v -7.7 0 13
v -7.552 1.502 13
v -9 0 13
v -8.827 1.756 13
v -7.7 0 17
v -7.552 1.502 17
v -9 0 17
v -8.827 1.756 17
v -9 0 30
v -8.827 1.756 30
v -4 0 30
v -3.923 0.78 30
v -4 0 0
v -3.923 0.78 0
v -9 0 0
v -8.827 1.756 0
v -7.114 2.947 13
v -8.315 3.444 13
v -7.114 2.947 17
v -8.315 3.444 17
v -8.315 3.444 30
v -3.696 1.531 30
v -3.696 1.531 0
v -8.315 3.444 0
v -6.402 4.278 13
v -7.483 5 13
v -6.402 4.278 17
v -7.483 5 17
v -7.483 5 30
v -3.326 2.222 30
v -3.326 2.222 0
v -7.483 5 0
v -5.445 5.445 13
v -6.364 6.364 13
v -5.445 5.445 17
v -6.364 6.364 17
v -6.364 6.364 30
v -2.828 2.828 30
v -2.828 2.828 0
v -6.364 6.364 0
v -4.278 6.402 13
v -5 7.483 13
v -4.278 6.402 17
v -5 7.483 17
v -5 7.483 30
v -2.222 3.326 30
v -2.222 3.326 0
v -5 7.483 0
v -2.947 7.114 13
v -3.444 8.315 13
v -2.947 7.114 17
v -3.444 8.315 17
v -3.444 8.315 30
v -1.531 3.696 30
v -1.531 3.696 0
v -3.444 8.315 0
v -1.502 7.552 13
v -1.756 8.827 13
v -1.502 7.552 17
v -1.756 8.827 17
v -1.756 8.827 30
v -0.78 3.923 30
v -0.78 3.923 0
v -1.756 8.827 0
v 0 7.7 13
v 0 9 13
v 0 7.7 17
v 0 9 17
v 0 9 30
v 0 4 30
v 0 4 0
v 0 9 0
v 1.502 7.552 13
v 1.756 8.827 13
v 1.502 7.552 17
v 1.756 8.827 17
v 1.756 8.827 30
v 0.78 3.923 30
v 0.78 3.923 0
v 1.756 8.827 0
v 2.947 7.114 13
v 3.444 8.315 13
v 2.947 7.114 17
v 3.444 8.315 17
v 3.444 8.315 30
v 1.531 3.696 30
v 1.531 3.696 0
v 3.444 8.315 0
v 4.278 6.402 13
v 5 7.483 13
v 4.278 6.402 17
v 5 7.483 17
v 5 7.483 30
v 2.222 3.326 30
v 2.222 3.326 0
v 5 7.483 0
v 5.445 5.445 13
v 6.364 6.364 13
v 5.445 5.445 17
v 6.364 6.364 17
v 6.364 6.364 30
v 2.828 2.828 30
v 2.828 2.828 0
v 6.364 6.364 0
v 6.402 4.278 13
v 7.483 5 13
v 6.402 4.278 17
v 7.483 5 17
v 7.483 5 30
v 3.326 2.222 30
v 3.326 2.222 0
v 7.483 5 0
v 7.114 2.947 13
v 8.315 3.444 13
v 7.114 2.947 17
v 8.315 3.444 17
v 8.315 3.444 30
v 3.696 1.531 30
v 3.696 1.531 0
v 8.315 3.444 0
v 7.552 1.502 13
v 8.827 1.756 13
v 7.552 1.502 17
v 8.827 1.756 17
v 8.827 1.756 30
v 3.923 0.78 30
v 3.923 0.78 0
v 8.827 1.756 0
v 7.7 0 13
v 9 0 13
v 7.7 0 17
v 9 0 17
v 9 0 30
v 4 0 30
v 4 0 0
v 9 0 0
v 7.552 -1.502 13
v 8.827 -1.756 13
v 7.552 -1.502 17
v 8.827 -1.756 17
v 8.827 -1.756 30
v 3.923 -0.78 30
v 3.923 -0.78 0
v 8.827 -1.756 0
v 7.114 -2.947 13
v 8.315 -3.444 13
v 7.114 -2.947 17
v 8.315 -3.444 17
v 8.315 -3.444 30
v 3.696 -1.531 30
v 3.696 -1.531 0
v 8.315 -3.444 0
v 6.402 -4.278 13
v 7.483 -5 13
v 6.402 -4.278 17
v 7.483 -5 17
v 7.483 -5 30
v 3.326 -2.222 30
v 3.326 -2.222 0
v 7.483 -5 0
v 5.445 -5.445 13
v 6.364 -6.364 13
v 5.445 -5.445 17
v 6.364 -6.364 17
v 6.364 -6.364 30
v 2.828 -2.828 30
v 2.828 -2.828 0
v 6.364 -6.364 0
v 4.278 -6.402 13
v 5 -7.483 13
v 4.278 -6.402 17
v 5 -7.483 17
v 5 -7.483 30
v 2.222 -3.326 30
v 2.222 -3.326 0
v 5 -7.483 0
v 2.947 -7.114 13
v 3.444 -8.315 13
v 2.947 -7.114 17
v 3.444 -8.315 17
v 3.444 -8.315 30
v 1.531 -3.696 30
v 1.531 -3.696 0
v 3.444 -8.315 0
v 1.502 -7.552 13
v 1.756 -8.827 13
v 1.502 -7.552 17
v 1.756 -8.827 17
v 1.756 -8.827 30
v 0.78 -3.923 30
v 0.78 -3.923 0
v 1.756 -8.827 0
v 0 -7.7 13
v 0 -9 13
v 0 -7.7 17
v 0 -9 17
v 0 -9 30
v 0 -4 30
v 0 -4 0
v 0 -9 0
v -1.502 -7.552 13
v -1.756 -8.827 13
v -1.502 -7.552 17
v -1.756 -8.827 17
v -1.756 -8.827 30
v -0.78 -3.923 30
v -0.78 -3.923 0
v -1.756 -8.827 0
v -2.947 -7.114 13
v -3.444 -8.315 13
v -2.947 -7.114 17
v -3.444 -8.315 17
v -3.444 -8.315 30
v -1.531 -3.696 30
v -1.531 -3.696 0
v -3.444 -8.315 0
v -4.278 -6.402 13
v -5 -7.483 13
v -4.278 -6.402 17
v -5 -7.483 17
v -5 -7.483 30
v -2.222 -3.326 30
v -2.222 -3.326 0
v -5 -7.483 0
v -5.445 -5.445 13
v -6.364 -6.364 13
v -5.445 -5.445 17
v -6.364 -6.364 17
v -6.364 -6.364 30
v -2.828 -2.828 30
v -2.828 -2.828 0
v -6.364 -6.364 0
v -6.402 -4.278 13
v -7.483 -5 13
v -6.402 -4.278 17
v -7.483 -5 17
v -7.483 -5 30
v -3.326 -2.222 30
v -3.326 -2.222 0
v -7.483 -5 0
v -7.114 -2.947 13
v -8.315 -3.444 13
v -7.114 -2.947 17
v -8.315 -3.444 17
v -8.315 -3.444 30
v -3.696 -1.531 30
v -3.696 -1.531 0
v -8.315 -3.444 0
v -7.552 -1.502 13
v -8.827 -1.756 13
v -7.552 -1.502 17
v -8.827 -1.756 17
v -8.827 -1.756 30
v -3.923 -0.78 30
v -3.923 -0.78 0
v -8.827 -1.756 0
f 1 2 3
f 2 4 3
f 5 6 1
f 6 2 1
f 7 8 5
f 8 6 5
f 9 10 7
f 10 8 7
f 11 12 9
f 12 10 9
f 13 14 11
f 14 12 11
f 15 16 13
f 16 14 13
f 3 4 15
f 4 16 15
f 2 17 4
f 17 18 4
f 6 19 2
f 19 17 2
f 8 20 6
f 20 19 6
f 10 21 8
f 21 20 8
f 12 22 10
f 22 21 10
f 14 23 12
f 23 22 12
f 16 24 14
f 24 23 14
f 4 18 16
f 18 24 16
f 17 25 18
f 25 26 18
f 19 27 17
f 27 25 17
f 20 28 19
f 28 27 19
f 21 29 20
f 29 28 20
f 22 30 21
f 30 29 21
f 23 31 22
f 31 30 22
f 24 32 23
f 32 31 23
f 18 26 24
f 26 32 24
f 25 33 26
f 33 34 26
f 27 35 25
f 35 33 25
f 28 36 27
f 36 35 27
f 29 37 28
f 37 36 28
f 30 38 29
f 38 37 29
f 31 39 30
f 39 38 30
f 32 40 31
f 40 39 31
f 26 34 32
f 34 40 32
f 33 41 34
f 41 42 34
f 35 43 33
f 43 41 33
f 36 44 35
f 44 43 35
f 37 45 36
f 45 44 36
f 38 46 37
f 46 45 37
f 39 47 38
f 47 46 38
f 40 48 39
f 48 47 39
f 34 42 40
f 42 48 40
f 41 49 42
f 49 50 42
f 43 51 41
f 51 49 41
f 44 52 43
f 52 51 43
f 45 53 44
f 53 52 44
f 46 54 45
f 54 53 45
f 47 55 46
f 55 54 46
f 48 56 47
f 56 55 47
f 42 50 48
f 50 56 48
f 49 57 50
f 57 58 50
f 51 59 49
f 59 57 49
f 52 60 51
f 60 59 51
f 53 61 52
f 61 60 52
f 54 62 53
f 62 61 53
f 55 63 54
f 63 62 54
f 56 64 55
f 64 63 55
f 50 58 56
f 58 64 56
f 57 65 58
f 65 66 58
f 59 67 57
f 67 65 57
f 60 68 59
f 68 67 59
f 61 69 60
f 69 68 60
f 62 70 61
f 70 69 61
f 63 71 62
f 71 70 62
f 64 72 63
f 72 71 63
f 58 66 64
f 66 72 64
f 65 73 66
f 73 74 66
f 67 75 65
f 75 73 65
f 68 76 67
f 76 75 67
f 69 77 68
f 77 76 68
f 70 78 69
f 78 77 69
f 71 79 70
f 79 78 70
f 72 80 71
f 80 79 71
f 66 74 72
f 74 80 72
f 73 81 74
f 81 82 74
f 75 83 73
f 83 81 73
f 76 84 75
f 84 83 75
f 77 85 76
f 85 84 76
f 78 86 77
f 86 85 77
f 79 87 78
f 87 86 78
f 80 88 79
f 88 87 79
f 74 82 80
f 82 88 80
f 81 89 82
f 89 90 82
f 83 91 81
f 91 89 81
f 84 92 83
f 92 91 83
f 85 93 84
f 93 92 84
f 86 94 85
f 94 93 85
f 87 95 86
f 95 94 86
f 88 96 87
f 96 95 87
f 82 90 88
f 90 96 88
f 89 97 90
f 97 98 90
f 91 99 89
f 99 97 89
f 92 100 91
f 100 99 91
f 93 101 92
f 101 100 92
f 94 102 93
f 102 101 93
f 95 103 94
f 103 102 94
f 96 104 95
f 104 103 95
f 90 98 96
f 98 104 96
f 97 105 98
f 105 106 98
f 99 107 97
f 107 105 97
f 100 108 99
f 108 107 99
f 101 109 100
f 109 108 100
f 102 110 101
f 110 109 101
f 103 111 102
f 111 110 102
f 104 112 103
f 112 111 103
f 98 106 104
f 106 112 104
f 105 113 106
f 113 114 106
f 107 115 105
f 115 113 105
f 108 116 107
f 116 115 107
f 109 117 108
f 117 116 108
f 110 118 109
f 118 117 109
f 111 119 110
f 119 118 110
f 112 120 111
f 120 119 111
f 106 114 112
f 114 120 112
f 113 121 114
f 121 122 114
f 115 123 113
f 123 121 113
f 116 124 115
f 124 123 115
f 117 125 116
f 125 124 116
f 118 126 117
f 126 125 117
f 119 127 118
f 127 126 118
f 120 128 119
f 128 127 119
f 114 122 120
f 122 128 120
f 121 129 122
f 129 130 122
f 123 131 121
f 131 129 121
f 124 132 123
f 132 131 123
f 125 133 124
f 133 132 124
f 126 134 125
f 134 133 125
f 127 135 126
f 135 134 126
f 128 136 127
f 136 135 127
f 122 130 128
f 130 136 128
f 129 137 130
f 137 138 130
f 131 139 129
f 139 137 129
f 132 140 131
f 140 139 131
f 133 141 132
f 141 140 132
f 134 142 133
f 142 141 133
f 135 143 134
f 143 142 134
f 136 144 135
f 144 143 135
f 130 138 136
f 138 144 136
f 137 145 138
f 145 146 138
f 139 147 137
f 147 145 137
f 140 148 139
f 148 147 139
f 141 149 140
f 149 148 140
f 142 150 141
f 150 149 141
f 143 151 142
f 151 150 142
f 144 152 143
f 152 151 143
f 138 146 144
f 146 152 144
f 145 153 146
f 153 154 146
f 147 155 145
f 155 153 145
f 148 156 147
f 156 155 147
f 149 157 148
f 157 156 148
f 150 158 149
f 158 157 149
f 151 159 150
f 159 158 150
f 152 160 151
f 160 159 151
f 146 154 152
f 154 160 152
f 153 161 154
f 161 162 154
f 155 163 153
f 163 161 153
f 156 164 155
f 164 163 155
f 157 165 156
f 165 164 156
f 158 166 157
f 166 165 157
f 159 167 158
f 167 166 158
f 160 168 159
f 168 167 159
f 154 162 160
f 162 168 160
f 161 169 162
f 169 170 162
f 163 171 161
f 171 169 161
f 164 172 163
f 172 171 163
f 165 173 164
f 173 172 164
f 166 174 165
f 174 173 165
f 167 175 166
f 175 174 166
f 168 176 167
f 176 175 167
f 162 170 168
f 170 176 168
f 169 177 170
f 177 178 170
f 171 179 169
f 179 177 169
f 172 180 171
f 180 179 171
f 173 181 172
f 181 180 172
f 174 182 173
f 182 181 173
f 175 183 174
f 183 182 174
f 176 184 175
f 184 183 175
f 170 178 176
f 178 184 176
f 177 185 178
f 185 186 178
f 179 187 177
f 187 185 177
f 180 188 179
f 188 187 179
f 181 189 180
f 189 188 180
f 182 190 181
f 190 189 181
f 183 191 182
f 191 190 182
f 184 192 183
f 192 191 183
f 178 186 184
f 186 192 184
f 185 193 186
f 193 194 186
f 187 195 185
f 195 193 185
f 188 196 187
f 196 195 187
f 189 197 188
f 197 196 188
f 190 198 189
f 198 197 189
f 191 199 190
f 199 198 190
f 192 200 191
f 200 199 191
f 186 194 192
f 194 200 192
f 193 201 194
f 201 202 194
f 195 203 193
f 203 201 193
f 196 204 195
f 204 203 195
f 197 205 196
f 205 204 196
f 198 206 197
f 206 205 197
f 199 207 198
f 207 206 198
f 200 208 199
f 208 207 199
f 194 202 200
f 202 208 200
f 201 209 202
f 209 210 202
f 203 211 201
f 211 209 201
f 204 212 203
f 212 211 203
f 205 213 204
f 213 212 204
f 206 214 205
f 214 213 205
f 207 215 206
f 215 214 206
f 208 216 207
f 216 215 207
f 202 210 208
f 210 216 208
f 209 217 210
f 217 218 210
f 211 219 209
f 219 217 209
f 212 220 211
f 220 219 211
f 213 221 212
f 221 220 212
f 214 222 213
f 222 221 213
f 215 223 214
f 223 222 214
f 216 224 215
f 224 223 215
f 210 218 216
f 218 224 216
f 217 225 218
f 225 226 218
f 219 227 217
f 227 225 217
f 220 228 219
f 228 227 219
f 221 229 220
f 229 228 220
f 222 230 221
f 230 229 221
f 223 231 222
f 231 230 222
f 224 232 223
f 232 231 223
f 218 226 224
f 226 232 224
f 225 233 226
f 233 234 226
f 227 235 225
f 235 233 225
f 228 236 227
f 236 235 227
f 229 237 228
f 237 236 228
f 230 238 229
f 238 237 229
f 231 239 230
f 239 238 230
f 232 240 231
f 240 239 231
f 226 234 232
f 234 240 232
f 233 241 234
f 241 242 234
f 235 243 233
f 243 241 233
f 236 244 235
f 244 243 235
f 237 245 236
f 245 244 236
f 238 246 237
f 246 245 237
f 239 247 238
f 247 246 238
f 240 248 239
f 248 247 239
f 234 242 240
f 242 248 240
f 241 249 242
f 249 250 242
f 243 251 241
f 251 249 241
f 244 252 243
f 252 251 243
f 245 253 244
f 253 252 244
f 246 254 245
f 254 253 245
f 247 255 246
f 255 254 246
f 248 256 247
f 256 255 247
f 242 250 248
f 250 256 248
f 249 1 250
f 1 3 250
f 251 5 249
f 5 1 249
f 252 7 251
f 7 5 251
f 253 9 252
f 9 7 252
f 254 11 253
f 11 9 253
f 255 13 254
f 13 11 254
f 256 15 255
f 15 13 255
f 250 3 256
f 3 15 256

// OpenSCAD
$fn = 32;

// ----------------------------------------------------------------------
// Grooved revolve: plain_grooves, bore R4
// ----------------------------------------------------------------------

// --- parameters (mm) ---
bore_r = 4;               // bore radius
outer_r = 9;              // outer radius of the body
total_h = 30;             // overall height, Z
wall = 5;                 // radial wall thickness
groove_w = 4;             // groove width
groove_d = 1.3;           // groove depth
grooves = 1;              // number of outer grooves

bbox_x = 2 * outer_r;  // full diameter
bore_d = 2 * bore_r;  // bore diameter
body_d = 2 * outer_r;  // body diameter
revolve_angle = 360;  // full turn around the Z axis

profile = [[4, 0], [9, 0], [9, 13], [7.7, 13], [7.7, 17], [9, 17], [9, 30], [4, 30]];  // primary outline, 8 points, counter clockwise

// --- the one profile operation ---
rotate_extrude(angle = revolve_angle) polygon(points = profile);
